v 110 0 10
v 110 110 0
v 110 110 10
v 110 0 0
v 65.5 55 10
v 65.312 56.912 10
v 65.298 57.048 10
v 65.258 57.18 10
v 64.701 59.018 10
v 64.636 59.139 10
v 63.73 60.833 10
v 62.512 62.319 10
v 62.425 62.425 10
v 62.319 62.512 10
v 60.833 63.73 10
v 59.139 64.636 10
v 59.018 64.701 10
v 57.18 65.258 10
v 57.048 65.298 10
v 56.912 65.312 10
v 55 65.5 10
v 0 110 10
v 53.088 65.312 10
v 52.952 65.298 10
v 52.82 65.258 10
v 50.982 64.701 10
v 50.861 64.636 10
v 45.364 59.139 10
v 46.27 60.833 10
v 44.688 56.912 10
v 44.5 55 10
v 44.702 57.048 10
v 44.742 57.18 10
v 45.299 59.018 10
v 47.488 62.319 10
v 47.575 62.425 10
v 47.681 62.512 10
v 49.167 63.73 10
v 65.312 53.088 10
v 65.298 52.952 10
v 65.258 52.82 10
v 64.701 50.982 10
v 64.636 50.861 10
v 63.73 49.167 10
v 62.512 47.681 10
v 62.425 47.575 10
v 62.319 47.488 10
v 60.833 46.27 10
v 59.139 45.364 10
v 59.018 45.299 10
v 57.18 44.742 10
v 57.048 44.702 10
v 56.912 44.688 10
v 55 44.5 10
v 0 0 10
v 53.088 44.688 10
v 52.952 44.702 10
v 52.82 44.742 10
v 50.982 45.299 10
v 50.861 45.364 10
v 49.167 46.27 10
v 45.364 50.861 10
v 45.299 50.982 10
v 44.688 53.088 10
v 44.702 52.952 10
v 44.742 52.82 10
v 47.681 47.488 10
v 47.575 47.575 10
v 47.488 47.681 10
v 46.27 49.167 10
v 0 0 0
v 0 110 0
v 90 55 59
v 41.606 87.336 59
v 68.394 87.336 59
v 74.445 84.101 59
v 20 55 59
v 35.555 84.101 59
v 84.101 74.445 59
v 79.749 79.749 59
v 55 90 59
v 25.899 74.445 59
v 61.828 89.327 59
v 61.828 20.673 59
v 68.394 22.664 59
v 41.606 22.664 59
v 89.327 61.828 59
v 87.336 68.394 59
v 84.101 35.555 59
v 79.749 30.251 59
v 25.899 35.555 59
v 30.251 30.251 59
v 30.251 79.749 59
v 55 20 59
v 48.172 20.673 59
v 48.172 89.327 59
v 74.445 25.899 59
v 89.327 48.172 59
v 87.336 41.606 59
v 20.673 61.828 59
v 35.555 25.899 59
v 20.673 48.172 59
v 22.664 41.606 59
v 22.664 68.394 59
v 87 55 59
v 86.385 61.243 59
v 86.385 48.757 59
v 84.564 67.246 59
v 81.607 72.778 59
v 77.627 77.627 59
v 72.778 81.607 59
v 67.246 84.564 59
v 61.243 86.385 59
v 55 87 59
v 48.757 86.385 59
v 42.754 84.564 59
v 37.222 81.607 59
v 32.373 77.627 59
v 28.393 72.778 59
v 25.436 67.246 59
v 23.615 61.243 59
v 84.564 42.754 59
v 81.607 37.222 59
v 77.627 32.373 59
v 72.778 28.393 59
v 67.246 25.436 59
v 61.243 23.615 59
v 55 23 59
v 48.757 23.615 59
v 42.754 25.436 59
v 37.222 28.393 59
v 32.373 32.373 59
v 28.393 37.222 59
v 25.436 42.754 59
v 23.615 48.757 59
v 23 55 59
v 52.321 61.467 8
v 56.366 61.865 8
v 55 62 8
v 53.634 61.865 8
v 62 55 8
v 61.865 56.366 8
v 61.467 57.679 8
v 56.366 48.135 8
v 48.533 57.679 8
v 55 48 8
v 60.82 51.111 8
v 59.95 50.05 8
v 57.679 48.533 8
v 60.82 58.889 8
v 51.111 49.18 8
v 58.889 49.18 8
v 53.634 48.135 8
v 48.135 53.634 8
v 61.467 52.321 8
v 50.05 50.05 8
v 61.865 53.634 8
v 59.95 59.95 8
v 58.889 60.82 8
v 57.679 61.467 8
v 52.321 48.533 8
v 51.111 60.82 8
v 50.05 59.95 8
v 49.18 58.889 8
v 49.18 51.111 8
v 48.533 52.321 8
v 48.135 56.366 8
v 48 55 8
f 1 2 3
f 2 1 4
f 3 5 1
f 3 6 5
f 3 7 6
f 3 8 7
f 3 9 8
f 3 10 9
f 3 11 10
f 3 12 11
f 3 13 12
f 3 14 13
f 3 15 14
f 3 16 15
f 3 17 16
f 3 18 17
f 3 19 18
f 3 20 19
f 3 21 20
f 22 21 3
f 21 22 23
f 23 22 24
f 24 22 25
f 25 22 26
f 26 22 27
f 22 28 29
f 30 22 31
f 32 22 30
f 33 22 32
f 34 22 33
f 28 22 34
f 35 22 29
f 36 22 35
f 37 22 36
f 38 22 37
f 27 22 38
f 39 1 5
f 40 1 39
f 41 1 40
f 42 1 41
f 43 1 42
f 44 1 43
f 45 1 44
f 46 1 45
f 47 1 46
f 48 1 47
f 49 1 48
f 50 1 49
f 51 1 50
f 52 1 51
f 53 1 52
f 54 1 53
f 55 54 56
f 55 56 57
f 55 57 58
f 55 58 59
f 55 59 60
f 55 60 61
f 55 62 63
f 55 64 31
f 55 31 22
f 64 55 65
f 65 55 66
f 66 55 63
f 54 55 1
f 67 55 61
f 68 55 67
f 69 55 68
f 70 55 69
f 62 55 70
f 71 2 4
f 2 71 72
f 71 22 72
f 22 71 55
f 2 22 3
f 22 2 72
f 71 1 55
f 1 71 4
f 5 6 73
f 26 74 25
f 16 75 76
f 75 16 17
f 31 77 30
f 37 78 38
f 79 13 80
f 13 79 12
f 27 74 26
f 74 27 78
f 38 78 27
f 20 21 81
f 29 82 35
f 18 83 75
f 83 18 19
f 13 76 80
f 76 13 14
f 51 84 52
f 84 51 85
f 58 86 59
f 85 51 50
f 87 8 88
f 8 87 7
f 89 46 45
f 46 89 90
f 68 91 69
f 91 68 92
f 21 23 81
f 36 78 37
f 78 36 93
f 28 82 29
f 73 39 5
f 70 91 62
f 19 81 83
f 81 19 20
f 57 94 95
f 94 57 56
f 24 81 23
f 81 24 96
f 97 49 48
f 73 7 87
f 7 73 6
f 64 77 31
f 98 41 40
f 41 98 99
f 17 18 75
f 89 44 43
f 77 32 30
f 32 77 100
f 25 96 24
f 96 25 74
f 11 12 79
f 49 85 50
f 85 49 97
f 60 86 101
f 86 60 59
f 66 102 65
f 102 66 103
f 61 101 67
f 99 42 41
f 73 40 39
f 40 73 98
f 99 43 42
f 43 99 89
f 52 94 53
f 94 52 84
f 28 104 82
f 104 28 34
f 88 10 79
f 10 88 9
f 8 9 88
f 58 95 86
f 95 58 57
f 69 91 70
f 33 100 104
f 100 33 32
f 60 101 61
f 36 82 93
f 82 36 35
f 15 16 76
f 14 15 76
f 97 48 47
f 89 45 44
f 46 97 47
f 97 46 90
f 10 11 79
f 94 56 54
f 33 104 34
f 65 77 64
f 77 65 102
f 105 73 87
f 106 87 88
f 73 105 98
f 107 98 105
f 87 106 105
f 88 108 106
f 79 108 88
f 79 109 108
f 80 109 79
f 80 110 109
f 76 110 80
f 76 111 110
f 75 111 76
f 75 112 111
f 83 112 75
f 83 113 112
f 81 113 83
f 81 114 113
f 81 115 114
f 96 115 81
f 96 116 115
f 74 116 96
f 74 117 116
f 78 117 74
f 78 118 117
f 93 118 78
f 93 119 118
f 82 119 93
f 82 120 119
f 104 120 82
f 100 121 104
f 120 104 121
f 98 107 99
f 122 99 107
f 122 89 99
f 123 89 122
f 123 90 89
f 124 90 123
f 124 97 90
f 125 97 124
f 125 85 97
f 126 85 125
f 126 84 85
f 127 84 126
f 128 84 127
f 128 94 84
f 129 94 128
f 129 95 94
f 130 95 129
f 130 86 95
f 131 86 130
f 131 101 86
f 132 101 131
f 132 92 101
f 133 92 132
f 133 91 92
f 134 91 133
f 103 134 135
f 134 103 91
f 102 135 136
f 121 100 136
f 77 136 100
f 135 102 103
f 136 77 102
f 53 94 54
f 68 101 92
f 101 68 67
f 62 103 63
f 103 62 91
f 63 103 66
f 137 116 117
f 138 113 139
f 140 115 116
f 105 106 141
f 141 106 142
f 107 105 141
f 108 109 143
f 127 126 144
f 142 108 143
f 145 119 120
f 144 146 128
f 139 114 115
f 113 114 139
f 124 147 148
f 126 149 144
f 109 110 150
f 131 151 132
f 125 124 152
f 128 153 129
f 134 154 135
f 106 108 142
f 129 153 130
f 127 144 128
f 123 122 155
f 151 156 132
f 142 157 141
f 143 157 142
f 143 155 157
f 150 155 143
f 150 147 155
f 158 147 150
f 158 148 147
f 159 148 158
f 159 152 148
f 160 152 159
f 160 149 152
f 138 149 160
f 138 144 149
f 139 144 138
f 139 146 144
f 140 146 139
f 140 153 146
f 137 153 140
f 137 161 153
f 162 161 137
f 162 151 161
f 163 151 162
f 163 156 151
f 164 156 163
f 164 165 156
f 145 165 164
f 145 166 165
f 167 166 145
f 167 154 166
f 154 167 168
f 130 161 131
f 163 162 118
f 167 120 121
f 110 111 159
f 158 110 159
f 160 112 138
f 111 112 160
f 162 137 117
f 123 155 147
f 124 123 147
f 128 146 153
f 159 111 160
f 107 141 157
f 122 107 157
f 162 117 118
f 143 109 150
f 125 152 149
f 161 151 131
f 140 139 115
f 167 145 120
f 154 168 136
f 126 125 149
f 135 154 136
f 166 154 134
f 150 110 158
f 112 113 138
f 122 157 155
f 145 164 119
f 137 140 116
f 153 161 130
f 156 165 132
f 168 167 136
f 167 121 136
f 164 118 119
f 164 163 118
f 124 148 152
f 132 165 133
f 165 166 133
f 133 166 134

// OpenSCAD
$fn = 32;

// ----------------------------------------------------------------------
// Hopper: funnel with square flange
// ----------------------------------------------------------------------

// --- parameters (mm) ---
fl = 110;                 // flange side, X and Y
fl_t = 10;                // flange thickness
cone_h = 50;              // cone height above the flange
top_d = 70;               // cone mouth diameter
bot_d = 20;               // cone spout diameter
wall = 3;                 // cone wall thickness

bore_d = bot_d - 2 * wall;  // spout bore diameter
total_h = fl_t + cone_h - 1;  // overall height

difference() {
  union() {
    cube([fl, fl, fl_t]);
    translate([fl / 2, fl / 2, fl_t - 1])
      cylinder(h = cone_h, d1 = bot_d, d2 = top_d);
  }
  translate([fl / 2, fl / 2, fl_t - 2])
    cylinder(h = cone_h + 1, d1 = bore_d, d2 = top_d - 2 * wall);
}
